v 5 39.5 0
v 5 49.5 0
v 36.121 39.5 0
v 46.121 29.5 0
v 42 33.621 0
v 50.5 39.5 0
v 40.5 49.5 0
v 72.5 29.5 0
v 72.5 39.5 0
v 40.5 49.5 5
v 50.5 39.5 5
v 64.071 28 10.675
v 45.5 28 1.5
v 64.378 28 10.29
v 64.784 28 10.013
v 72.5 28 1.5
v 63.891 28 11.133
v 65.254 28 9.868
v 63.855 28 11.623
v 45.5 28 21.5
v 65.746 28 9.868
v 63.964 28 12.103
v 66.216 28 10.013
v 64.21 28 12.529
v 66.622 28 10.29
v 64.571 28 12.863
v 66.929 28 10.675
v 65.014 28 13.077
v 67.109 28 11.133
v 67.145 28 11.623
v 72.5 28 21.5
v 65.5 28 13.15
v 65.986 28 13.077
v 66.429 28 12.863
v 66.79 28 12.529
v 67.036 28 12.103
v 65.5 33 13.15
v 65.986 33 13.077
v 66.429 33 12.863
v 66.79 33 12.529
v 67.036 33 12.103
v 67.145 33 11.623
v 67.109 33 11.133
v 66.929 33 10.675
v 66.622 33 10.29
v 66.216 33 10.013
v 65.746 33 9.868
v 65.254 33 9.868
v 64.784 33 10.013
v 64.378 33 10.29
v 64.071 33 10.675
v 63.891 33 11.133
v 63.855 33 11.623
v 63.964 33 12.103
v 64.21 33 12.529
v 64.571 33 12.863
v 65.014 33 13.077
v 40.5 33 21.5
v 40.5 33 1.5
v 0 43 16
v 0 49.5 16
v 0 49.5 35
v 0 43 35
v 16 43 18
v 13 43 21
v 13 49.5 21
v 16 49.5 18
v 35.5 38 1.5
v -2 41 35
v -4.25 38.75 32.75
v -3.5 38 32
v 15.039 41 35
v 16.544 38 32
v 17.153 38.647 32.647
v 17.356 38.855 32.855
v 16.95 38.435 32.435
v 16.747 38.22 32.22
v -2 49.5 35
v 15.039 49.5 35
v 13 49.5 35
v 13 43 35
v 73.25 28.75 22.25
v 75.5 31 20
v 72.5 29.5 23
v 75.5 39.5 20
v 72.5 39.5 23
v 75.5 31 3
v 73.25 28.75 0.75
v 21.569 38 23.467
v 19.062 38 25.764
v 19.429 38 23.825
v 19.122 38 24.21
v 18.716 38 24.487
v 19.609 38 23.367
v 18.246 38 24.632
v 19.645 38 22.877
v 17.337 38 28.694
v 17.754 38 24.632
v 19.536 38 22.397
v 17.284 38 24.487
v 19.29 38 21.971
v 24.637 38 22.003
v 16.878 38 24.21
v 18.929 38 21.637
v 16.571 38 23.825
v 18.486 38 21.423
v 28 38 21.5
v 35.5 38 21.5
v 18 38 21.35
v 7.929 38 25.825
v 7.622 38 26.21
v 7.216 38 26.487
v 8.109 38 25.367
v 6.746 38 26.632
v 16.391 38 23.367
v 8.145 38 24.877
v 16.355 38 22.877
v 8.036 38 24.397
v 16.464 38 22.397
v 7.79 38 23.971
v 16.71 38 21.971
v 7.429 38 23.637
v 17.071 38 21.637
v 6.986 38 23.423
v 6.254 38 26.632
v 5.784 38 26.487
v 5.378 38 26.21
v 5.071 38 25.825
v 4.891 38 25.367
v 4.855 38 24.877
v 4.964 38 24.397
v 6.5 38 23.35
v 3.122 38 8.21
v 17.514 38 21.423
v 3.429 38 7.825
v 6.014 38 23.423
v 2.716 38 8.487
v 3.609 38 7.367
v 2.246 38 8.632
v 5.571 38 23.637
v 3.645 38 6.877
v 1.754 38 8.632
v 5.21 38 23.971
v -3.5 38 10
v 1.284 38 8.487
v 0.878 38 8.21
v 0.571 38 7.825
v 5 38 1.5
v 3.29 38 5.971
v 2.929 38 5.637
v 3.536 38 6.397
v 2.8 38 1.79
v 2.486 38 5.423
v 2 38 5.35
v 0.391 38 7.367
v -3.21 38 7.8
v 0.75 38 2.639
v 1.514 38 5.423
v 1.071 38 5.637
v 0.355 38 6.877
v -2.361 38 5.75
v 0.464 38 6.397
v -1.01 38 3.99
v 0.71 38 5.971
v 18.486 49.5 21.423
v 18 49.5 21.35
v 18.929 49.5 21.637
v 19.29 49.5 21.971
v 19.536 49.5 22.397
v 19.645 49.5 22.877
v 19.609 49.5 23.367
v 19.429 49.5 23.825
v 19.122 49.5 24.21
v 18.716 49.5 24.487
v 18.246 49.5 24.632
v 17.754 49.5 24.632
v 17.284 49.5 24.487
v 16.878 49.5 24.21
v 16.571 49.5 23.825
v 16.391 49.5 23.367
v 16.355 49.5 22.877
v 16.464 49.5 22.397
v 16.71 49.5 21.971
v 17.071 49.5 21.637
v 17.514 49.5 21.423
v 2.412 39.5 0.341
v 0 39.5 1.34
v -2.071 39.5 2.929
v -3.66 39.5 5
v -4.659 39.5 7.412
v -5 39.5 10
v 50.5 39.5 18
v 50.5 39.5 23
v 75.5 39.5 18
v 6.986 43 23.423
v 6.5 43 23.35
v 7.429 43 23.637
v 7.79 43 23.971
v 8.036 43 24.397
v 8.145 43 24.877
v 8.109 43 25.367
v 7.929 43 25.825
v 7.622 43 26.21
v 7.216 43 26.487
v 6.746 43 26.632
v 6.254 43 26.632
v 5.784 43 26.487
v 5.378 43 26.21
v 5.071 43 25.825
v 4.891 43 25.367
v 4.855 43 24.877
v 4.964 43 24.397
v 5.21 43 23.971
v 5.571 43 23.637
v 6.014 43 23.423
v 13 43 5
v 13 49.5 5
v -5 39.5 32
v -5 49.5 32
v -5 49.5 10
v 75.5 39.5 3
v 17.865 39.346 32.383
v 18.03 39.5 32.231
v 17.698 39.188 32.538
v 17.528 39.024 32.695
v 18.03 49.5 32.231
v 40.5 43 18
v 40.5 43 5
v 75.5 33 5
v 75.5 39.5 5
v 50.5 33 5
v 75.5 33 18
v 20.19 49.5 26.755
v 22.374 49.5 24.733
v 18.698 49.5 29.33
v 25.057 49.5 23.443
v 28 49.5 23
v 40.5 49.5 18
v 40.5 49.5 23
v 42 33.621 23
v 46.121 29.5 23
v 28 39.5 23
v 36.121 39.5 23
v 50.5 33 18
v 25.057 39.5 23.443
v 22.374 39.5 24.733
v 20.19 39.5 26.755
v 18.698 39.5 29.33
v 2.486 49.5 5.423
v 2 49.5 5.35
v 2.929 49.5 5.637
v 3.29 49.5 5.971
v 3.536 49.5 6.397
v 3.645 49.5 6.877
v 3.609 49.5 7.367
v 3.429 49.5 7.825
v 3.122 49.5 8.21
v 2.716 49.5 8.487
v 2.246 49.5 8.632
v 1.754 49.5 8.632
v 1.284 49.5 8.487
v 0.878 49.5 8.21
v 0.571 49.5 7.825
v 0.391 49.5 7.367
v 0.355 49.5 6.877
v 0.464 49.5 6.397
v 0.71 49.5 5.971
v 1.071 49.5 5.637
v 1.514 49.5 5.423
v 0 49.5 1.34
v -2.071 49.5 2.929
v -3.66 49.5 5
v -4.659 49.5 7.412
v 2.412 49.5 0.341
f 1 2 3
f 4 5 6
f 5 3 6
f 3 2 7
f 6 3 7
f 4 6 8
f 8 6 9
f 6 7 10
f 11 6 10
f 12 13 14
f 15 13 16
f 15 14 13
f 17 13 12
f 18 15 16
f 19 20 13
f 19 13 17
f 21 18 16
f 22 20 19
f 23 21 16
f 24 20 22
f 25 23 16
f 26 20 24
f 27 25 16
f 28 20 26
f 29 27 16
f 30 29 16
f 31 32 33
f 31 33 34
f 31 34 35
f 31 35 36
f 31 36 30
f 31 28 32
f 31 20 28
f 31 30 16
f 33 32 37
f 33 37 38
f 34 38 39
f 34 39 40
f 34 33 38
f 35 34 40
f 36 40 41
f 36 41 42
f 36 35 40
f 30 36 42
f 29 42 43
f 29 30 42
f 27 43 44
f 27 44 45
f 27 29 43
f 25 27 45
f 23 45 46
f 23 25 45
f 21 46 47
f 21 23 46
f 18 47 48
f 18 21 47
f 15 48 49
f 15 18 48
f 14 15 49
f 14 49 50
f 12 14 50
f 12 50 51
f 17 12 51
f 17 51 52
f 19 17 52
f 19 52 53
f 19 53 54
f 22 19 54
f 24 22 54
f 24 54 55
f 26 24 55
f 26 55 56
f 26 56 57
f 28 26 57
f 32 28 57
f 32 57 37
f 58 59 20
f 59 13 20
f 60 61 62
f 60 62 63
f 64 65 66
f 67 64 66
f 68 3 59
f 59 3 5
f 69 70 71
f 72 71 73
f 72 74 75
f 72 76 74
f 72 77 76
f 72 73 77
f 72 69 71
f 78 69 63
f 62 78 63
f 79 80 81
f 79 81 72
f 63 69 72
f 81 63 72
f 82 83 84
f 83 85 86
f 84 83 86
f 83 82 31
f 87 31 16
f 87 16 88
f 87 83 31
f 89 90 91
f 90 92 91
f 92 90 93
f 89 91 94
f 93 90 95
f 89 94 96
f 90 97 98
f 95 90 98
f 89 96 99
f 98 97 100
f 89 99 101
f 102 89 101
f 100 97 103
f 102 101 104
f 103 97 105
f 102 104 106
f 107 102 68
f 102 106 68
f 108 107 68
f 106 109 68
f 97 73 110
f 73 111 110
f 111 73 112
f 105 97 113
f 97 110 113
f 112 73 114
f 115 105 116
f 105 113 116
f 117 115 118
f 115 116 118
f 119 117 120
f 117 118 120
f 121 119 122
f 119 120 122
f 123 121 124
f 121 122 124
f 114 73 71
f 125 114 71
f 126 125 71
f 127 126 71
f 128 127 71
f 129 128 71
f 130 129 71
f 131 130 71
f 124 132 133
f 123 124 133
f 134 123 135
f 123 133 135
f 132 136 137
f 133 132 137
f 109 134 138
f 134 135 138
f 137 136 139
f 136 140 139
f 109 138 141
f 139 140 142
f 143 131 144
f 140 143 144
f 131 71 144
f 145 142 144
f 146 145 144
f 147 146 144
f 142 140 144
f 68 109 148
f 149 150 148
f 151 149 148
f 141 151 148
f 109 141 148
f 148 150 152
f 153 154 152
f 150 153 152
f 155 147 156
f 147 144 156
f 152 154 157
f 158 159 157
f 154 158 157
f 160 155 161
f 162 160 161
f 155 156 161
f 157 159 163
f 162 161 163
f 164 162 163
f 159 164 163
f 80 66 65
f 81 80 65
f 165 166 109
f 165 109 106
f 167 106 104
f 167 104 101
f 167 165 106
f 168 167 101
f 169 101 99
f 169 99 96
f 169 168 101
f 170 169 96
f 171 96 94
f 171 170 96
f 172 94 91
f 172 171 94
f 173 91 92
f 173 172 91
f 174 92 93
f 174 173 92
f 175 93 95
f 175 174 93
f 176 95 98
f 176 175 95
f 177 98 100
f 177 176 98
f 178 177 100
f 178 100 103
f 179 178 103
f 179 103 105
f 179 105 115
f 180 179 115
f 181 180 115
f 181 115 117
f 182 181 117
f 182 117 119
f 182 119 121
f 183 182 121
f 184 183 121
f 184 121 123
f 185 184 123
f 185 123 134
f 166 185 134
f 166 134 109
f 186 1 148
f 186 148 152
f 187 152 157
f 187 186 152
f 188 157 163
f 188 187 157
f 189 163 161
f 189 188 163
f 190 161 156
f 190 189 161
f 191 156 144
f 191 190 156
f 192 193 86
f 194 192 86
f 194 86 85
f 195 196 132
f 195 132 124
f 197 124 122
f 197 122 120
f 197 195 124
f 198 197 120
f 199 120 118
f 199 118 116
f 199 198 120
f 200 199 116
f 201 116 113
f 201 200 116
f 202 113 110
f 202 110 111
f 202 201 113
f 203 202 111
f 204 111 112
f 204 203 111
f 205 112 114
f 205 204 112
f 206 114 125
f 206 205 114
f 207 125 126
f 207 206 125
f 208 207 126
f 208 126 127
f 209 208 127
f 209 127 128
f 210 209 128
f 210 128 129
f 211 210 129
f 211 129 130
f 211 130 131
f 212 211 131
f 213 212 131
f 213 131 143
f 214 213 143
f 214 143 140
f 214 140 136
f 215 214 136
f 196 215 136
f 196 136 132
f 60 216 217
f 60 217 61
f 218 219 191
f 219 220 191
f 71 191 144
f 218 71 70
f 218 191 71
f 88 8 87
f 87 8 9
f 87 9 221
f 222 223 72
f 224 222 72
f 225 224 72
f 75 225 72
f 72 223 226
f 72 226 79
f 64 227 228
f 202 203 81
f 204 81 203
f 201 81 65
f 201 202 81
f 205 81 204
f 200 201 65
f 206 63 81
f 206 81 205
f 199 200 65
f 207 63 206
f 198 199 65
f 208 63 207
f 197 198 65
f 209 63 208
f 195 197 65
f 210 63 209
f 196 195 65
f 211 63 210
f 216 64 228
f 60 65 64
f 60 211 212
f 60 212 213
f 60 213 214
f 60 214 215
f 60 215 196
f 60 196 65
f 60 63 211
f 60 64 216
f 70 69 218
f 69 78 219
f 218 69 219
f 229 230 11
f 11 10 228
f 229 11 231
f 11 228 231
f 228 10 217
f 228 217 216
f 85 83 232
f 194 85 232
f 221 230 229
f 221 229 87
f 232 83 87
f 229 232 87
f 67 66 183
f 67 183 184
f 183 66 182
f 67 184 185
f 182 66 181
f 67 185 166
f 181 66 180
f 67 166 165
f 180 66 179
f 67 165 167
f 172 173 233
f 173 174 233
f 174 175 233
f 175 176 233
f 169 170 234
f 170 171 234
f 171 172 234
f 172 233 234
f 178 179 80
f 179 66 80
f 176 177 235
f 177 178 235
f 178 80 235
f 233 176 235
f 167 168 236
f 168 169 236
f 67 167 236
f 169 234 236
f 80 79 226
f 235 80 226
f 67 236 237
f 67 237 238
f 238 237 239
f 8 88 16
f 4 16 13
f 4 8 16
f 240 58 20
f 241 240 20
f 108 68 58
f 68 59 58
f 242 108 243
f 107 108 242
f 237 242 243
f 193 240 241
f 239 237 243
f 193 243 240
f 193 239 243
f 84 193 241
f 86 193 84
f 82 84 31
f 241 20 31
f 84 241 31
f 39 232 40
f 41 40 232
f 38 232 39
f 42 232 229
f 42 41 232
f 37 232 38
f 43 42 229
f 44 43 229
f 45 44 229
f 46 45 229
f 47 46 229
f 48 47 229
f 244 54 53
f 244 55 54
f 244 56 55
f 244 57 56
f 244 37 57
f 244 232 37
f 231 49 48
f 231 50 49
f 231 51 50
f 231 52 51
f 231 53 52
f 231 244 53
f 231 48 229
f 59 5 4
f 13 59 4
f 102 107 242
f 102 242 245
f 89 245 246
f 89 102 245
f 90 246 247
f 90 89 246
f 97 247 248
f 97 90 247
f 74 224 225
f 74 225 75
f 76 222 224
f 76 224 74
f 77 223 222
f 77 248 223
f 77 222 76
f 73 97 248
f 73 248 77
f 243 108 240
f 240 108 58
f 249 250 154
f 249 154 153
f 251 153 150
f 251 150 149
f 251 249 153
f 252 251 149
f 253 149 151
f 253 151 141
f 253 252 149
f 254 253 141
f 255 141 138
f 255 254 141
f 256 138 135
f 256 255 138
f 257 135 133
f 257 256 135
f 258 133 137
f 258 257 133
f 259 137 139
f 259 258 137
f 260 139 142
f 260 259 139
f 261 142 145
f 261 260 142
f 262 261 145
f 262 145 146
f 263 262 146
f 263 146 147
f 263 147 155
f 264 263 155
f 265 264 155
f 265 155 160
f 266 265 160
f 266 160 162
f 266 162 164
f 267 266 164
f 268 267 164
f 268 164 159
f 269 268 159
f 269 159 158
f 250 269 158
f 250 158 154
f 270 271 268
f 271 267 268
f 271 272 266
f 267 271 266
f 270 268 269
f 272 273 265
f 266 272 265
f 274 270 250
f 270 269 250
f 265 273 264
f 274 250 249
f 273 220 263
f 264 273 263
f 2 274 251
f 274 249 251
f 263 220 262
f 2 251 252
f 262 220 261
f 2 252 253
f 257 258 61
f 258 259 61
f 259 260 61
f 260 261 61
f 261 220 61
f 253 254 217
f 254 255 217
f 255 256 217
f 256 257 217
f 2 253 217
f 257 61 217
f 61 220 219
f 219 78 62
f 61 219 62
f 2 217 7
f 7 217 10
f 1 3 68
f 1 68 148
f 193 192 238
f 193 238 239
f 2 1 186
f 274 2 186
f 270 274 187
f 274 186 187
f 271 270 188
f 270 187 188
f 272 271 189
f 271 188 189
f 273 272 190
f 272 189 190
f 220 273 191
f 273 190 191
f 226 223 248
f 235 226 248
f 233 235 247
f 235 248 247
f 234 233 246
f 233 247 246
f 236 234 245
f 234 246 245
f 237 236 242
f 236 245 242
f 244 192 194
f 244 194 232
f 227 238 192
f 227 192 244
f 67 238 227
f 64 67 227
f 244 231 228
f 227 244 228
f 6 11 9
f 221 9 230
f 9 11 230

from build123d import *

# Parameters (mm, degrees)
SKETCH_1_W               = 23
SKETCH_1_H               = 23
SKETCH_1_W_2             = 13
SKETCH_1_H_2             = 13
EXTRUDE_1_DEPTH          = 35
SKETCH_2_R               = 1.65
CUT_EXTRUDE_1_DEPTH      = 34
SKETCH_4_W               = 23
SKETCH_4_H               = 23
SKETCH_4_R               = 3
EXTRUDE_2_DEPTH          = 3.5
SKETCH_5_W               = 23
SKETCH_5_H               = 23
SKETCH_5_W_2             = 13
SKETCH_5_H_2             = 13
EXTRUDE_1_2_DEPTH        = 54
SKETCH_6_R               = 1.65
CUT_EXTRUDE_2_DEPTH      = 39
SKETCH_7_W               = 13
SKETCH_7_H               = 13
CUT_EXTRUDE_3_DEPTH      = 13
CHAMFER_1_SIZE           = 3
SKETCH_8_W               = 80.5
SKETCH_8_H               = 35
CUT_EXTRUDE_4_DEPTH      = 11.5
EXTRUDE_3_DEPTH          = 6.5
FILLET_1_R               = 10
FILLET_2_R               = 10
SKETCH_10_R              = 1.65
CUT_EXTRUDE_5_DEPTH      = 28.5
CHAMFER_4_SIZE           = 3
CHAMFER_START            = 6.5
CHAMFER_5_DEPTH          = 11.5
CUT_EXTRUDE_6_DEPTH      = 106
CUT_EXTRUDE_6_DEPTH_BACK = 86
SKETCH_12_W              = 100.531840745
SKETCH_12_H              = 30.474622789
SKETCH_13_W              = 10
SKETCH_13_H              = 23
EXTRUDE_5_DEPTH          = 10
CHAMFER_13_SIZE          = 10
CHAMFER_14_SIZE          = 10
CHAMFER_15_SIZE          = 5
CHAMFER_16_SIZE          = 5
CHAMFER_17_SIZE          = 1.5


with BuildPart() as part:
    # 草图1 → Extrude 1 (new body)
    with BuildSketch(Plane.XY):
        with Locations((6.5, 6.5)):
            Rectangle(SKETCH_1_W, SKETCH_1_H)
        with Locations((6.5, 6.5)):
            Rectangle(SKETCH_1_W_2, SKETCH_1_H_2, mode=Mode.SUBTRACT)
    extrude(amount=EXTRUDE_1_DEPTH)

    # 草图2 → 切除-拉伸1 (cut)
    with BuildSketch(Plane.XZ.offset(5)):
        with Locations(Location((6.5, 25, 0), (0, 0, 270))):
            Circle(SKETCH_2_R)
    extrude(amount=-CUT_EXTRUDE_1_DEPTH, mode=Mode.SUBTRACT)

    # 草图4 → 凸台-拉伸2 (add)
    with BuildSketch(Plane(origin=(18, 0, 0), x_dir=(0, 0, -1), z_dir=(1, 0, 0))):
        with Locations((-11.5, 6.5)):
            Rectangle(SKETCH_4_W, SKETCH_4_H)
        with Locations(Location((-11.5, 6.5, 0), (0, 0, 90))):
            Circle(SKETCH_4_R, mode=Mode.SUBTRACT)
    extrude(amount=EXTRUDE_2_DEPTH)

    # 草图5 → Extrude 1 2 (add)
    with BuildSketch(Plane(origin=(21.5, 0, 0), x_dir=(0, 0, -1), z_dir=(1, 0, 0))):
        with Locations((-11.5, 6.5)):
            Rectangle(SKETCH_5_W, SKETCH_5_H)
        with Locations((-11.5, 6.5)):
            Rectangle(SKETCH_5_W_2, SKETCH_5_H_2, mode=Mode.SUBTRACT)
    extrude(amount=EXTRUDE_1_2_DEPTH)

    # 草图6 → 切除-拉伸2 (cut)
    with BuildSketch(Plane(origin=(0, 18, 0), x_dir=(1, 0, 0), z_dir=(0, 1, 0))):
        with Locations(Location((65.5, -11.5, 0), (0, 0, 270))):
            Circle(SKETCH_6_R)
    extrude(amount=-CUT_EXTRUDE_2_DEPTH, mode=Mode.SUBTRACT)

    # 草图7 → 切除-拉伸3 (cut)
    with BuildSketch(Plane(origin=(21.5, 0, 0), x_dir=(0, 0, -1), z_dir=(1, 0, 0))):
        with Locations((-11.5, 6.5)):
            Rectangle(SKETCH_7_W, SKETCH_7_H)
    extrude(amount=-CUT_EXTRUDE_3_DEPTH, mode=Mode.SUBTRACT)

    # 倒角1
    chamfer_1_edges = [part.edges().sort_by_distance(p)[0] for p in [
        (13, 6.5, 18),
    ]]
    chamfer(chamfer_1_edges, length=CHAMFER_1_SIZE)

    # 草图8 → 切除-拉伸4 (cut)
    with BuildSketch(Plane.XZ.offset(5)):
        with Locations((35.25, 17.5)):
            Rectangle(SKETCH_8_W, SKETCH_8_H)
    extrude(amount=-CUT_EXTRUDE_4_DEPTH, mode=Mode.SUBTRACT)

    # 草图9 → 凸台-拉伸3 (add)
    with BuildSketch(Plane.XZ.offset(-13)):
        Polygon((13, 5), (0, 16), (0, 0), (13, 0), align=None)
    extrude(amount=EXTRUDE_3_DEPTH)

    # 圆角1
    fillet_1_edges = [part.edges().sort_by_distance(p)[0] for p in [
        (-5, 12.25, 0),
    ]]
    fillet(fillet_1_edges, radius=FILLET_1_R)

    # 圆角2
    fillet_2_edges = [part.edges().sort_by_distance(p)[0] for p in [
        (18, 12.25, 23),
    ]]
    fillet(fillet_2_edges, radius=FILLET_2_R)

    # 草图10 → 切除-拉伸5 (cut)
    with BuildSketch(Plane.XZ.offset(-6.5)):
        with Locations(Location((2, 7, 0), (0, 0, 270))):
            Circle(SKETCH_10_R)
        with Locations(Location((18, 23, 0), (0, 0, 270))):
            Circle(SKETCH_10_R)
    extrude(amount=-CUT_EXTRUDE_5_DEPTH, mode=Mode.SUBTRACT)

    # 倒角4
    chamfer_4_edges = [part.edges().sort_by_distance(p)[0] for p in [
        (75.5, 18, 11.5),
        (6.5, 18, 35),
    ]]
    chamfer(chamfer_4_edges, length=CHAMFER_4_SIZE)

    # 倒角5: read off the stored shape, not the designer's step
    # 倒角5 outline → 倒角5 (cut)
    with BuildSketch(Plane(origin=(0, 0, 0), x_dir=(1, 0, 0), z_dir=(0, 1, 0)).offset(CHAMFER_START)):
        Polygon((72.5, 0), (75.5, -3), (75.5, 0), align=None)
        Polygon((-5, -35), (-2, -35), (-5, -32), align=None)
        with BuildLine():
            ThreePointArc((18, -33), (18.007410169, -32.615099398), (18.029629695, -32.230769231))
            Line((18.029629695, -32.230769231), (15.038518603, -35))
            Line((15.038518603, -35), (18, -35))
            Line((18, -35), (18, -33))
        make_face()
        Polygon((75.5, -20), (72.5, -23), (75.5, -23), align=None)
    extrude(amount=CHAMFER_5_DEPTH, mode=Mode.SUBTRACT)


with BuildPart() as body_2:
    # Split Bodies 1: the piece on the far side of the plane
    add(part.part)
    split(bisect_by=Plane.YZ.offset(50.5), keep=Keep.BOTTOM)


with BuildPart() as part_1:
    add(part.part)

    # Split Bodies 1
    split(bisect_by=Plane.YZ.offset(50.5), keep=Keep.TOP)


with BuildPart() as part_2:
    # Move Body 1: read off the stored shape, not the designer's step
    # Move Body 1: moved
    add(part_1.part.moved(Location((0, 10, 0))))

    # Combine 1: union body 2
    add(body_2.part)


with BuildPart() as body_2_2:
    # 镜向1: mirrored copy
    add(part_2.part.mirror(Plane(origin=(-5, 28, 35), x_dir=(0, 0, 1), z_dir=(0, -1, 0))))

    # 草图13 → 凸台-拉伸5 (add)
    with BuildSketch(Plane.XZ.offset(-38)):
        with Locations((45.5, 11.5)):
            Rectangle(SKETCH_13_W, SKETCH_13_H)
    extrude(amount=EXTRUDE_5_DEPTH)

    # 倒角13
    # the kernel refuses this chamfer: 10 mm, written as the material it takes off along each edge
    with BuildSketch(Plane(origin=(50.5, 43, 5), x_dir=(0, -1, 0), z_dir=(0, 0, 1))) as chamfer_13_piece_1:
        Polygon((CHAMFER_13_SIZE, 0), (0, -CHAMFER_13_SIZE), (0, 0), align=None)
    extrude(amount=13, mode=Mode.SUBTRACT)

    # 倒角14
    chamfer_14_edges = [body_2_2.edges().sort_by_distance(p)[0] for p in [
        (50.5, 49.5, 2.5),
        (50.5, 49.5, 20.5),
    ]]
    chamfer(chamfer_14_edges, length=CHAMFER_14_SIZE - 0.0001)  # a hair under: the kernel refuses the full size

    # 倒角15
    chamfer_15_edges = [body_2_2.edges().sort_by_distance(p)[0] for p in [
        (40.5, 38, 11.5),
    ]]
    chamfer(chamfer_15_edges, length=CHAMFER_15_SIZE)

    # 倒角16
    chamfer_16_edges = [body_2_2.edges().sort_by_distance(p)[0] for p in [
        (40.5, 28, 11.5),
    ]]
    chamfer(chamfer_16_edges, length=CHAMFER_16_SIZE - 0.0001)  # a hair under: the kernel refuses the full size

    # 倒角17
    chamfer_17_edges = [body_2_2.edges().sort_by_distance(p)[0] for p in [
        (40.5, 32.99995, 23),
        (42.99995, 30.49995, 23),
        (38, 35.5, 23),
        (58.99995, 28, 23),
        (31.75, 38, 23),
        (40.5, 32.99995, 0),
        (42.99995, 30.49995, 0),
        (38, 35.5, 0),
        (58.99995, 28, 0),
        (20.25, 38, 0),
        (-2.071067812, 38, 2.928932188),
        (-5, 38, 21),
        (21.291796068, 38, 25.583801513),
    ]]
    chamfer(chamfer_17_edges, length=CHAMFER_17_SIZE)


with BuildPart() as part_3:
    add(part_2.part)

    # 草图12 → 切除-拉伸6 (cut, two sides: drawn at the far end of the back side and taken through both)
    with BuildSketch(Plane.XY.offset(23).offset(-CUT_EXTRUDE_6_DEPTH_BACK)):
        with Locations((32.005641973, 12.762688605)):
            Rectangle(SKETCH_12_W, SKETCH_12_H)
    extrude(amount=CUT_EXTRUDE_6_DEPTH + CUT_EXTRUDE_6_DEPTH_BACK, mode=Mode.SUBTRACT)


solid = body_2_2.part
